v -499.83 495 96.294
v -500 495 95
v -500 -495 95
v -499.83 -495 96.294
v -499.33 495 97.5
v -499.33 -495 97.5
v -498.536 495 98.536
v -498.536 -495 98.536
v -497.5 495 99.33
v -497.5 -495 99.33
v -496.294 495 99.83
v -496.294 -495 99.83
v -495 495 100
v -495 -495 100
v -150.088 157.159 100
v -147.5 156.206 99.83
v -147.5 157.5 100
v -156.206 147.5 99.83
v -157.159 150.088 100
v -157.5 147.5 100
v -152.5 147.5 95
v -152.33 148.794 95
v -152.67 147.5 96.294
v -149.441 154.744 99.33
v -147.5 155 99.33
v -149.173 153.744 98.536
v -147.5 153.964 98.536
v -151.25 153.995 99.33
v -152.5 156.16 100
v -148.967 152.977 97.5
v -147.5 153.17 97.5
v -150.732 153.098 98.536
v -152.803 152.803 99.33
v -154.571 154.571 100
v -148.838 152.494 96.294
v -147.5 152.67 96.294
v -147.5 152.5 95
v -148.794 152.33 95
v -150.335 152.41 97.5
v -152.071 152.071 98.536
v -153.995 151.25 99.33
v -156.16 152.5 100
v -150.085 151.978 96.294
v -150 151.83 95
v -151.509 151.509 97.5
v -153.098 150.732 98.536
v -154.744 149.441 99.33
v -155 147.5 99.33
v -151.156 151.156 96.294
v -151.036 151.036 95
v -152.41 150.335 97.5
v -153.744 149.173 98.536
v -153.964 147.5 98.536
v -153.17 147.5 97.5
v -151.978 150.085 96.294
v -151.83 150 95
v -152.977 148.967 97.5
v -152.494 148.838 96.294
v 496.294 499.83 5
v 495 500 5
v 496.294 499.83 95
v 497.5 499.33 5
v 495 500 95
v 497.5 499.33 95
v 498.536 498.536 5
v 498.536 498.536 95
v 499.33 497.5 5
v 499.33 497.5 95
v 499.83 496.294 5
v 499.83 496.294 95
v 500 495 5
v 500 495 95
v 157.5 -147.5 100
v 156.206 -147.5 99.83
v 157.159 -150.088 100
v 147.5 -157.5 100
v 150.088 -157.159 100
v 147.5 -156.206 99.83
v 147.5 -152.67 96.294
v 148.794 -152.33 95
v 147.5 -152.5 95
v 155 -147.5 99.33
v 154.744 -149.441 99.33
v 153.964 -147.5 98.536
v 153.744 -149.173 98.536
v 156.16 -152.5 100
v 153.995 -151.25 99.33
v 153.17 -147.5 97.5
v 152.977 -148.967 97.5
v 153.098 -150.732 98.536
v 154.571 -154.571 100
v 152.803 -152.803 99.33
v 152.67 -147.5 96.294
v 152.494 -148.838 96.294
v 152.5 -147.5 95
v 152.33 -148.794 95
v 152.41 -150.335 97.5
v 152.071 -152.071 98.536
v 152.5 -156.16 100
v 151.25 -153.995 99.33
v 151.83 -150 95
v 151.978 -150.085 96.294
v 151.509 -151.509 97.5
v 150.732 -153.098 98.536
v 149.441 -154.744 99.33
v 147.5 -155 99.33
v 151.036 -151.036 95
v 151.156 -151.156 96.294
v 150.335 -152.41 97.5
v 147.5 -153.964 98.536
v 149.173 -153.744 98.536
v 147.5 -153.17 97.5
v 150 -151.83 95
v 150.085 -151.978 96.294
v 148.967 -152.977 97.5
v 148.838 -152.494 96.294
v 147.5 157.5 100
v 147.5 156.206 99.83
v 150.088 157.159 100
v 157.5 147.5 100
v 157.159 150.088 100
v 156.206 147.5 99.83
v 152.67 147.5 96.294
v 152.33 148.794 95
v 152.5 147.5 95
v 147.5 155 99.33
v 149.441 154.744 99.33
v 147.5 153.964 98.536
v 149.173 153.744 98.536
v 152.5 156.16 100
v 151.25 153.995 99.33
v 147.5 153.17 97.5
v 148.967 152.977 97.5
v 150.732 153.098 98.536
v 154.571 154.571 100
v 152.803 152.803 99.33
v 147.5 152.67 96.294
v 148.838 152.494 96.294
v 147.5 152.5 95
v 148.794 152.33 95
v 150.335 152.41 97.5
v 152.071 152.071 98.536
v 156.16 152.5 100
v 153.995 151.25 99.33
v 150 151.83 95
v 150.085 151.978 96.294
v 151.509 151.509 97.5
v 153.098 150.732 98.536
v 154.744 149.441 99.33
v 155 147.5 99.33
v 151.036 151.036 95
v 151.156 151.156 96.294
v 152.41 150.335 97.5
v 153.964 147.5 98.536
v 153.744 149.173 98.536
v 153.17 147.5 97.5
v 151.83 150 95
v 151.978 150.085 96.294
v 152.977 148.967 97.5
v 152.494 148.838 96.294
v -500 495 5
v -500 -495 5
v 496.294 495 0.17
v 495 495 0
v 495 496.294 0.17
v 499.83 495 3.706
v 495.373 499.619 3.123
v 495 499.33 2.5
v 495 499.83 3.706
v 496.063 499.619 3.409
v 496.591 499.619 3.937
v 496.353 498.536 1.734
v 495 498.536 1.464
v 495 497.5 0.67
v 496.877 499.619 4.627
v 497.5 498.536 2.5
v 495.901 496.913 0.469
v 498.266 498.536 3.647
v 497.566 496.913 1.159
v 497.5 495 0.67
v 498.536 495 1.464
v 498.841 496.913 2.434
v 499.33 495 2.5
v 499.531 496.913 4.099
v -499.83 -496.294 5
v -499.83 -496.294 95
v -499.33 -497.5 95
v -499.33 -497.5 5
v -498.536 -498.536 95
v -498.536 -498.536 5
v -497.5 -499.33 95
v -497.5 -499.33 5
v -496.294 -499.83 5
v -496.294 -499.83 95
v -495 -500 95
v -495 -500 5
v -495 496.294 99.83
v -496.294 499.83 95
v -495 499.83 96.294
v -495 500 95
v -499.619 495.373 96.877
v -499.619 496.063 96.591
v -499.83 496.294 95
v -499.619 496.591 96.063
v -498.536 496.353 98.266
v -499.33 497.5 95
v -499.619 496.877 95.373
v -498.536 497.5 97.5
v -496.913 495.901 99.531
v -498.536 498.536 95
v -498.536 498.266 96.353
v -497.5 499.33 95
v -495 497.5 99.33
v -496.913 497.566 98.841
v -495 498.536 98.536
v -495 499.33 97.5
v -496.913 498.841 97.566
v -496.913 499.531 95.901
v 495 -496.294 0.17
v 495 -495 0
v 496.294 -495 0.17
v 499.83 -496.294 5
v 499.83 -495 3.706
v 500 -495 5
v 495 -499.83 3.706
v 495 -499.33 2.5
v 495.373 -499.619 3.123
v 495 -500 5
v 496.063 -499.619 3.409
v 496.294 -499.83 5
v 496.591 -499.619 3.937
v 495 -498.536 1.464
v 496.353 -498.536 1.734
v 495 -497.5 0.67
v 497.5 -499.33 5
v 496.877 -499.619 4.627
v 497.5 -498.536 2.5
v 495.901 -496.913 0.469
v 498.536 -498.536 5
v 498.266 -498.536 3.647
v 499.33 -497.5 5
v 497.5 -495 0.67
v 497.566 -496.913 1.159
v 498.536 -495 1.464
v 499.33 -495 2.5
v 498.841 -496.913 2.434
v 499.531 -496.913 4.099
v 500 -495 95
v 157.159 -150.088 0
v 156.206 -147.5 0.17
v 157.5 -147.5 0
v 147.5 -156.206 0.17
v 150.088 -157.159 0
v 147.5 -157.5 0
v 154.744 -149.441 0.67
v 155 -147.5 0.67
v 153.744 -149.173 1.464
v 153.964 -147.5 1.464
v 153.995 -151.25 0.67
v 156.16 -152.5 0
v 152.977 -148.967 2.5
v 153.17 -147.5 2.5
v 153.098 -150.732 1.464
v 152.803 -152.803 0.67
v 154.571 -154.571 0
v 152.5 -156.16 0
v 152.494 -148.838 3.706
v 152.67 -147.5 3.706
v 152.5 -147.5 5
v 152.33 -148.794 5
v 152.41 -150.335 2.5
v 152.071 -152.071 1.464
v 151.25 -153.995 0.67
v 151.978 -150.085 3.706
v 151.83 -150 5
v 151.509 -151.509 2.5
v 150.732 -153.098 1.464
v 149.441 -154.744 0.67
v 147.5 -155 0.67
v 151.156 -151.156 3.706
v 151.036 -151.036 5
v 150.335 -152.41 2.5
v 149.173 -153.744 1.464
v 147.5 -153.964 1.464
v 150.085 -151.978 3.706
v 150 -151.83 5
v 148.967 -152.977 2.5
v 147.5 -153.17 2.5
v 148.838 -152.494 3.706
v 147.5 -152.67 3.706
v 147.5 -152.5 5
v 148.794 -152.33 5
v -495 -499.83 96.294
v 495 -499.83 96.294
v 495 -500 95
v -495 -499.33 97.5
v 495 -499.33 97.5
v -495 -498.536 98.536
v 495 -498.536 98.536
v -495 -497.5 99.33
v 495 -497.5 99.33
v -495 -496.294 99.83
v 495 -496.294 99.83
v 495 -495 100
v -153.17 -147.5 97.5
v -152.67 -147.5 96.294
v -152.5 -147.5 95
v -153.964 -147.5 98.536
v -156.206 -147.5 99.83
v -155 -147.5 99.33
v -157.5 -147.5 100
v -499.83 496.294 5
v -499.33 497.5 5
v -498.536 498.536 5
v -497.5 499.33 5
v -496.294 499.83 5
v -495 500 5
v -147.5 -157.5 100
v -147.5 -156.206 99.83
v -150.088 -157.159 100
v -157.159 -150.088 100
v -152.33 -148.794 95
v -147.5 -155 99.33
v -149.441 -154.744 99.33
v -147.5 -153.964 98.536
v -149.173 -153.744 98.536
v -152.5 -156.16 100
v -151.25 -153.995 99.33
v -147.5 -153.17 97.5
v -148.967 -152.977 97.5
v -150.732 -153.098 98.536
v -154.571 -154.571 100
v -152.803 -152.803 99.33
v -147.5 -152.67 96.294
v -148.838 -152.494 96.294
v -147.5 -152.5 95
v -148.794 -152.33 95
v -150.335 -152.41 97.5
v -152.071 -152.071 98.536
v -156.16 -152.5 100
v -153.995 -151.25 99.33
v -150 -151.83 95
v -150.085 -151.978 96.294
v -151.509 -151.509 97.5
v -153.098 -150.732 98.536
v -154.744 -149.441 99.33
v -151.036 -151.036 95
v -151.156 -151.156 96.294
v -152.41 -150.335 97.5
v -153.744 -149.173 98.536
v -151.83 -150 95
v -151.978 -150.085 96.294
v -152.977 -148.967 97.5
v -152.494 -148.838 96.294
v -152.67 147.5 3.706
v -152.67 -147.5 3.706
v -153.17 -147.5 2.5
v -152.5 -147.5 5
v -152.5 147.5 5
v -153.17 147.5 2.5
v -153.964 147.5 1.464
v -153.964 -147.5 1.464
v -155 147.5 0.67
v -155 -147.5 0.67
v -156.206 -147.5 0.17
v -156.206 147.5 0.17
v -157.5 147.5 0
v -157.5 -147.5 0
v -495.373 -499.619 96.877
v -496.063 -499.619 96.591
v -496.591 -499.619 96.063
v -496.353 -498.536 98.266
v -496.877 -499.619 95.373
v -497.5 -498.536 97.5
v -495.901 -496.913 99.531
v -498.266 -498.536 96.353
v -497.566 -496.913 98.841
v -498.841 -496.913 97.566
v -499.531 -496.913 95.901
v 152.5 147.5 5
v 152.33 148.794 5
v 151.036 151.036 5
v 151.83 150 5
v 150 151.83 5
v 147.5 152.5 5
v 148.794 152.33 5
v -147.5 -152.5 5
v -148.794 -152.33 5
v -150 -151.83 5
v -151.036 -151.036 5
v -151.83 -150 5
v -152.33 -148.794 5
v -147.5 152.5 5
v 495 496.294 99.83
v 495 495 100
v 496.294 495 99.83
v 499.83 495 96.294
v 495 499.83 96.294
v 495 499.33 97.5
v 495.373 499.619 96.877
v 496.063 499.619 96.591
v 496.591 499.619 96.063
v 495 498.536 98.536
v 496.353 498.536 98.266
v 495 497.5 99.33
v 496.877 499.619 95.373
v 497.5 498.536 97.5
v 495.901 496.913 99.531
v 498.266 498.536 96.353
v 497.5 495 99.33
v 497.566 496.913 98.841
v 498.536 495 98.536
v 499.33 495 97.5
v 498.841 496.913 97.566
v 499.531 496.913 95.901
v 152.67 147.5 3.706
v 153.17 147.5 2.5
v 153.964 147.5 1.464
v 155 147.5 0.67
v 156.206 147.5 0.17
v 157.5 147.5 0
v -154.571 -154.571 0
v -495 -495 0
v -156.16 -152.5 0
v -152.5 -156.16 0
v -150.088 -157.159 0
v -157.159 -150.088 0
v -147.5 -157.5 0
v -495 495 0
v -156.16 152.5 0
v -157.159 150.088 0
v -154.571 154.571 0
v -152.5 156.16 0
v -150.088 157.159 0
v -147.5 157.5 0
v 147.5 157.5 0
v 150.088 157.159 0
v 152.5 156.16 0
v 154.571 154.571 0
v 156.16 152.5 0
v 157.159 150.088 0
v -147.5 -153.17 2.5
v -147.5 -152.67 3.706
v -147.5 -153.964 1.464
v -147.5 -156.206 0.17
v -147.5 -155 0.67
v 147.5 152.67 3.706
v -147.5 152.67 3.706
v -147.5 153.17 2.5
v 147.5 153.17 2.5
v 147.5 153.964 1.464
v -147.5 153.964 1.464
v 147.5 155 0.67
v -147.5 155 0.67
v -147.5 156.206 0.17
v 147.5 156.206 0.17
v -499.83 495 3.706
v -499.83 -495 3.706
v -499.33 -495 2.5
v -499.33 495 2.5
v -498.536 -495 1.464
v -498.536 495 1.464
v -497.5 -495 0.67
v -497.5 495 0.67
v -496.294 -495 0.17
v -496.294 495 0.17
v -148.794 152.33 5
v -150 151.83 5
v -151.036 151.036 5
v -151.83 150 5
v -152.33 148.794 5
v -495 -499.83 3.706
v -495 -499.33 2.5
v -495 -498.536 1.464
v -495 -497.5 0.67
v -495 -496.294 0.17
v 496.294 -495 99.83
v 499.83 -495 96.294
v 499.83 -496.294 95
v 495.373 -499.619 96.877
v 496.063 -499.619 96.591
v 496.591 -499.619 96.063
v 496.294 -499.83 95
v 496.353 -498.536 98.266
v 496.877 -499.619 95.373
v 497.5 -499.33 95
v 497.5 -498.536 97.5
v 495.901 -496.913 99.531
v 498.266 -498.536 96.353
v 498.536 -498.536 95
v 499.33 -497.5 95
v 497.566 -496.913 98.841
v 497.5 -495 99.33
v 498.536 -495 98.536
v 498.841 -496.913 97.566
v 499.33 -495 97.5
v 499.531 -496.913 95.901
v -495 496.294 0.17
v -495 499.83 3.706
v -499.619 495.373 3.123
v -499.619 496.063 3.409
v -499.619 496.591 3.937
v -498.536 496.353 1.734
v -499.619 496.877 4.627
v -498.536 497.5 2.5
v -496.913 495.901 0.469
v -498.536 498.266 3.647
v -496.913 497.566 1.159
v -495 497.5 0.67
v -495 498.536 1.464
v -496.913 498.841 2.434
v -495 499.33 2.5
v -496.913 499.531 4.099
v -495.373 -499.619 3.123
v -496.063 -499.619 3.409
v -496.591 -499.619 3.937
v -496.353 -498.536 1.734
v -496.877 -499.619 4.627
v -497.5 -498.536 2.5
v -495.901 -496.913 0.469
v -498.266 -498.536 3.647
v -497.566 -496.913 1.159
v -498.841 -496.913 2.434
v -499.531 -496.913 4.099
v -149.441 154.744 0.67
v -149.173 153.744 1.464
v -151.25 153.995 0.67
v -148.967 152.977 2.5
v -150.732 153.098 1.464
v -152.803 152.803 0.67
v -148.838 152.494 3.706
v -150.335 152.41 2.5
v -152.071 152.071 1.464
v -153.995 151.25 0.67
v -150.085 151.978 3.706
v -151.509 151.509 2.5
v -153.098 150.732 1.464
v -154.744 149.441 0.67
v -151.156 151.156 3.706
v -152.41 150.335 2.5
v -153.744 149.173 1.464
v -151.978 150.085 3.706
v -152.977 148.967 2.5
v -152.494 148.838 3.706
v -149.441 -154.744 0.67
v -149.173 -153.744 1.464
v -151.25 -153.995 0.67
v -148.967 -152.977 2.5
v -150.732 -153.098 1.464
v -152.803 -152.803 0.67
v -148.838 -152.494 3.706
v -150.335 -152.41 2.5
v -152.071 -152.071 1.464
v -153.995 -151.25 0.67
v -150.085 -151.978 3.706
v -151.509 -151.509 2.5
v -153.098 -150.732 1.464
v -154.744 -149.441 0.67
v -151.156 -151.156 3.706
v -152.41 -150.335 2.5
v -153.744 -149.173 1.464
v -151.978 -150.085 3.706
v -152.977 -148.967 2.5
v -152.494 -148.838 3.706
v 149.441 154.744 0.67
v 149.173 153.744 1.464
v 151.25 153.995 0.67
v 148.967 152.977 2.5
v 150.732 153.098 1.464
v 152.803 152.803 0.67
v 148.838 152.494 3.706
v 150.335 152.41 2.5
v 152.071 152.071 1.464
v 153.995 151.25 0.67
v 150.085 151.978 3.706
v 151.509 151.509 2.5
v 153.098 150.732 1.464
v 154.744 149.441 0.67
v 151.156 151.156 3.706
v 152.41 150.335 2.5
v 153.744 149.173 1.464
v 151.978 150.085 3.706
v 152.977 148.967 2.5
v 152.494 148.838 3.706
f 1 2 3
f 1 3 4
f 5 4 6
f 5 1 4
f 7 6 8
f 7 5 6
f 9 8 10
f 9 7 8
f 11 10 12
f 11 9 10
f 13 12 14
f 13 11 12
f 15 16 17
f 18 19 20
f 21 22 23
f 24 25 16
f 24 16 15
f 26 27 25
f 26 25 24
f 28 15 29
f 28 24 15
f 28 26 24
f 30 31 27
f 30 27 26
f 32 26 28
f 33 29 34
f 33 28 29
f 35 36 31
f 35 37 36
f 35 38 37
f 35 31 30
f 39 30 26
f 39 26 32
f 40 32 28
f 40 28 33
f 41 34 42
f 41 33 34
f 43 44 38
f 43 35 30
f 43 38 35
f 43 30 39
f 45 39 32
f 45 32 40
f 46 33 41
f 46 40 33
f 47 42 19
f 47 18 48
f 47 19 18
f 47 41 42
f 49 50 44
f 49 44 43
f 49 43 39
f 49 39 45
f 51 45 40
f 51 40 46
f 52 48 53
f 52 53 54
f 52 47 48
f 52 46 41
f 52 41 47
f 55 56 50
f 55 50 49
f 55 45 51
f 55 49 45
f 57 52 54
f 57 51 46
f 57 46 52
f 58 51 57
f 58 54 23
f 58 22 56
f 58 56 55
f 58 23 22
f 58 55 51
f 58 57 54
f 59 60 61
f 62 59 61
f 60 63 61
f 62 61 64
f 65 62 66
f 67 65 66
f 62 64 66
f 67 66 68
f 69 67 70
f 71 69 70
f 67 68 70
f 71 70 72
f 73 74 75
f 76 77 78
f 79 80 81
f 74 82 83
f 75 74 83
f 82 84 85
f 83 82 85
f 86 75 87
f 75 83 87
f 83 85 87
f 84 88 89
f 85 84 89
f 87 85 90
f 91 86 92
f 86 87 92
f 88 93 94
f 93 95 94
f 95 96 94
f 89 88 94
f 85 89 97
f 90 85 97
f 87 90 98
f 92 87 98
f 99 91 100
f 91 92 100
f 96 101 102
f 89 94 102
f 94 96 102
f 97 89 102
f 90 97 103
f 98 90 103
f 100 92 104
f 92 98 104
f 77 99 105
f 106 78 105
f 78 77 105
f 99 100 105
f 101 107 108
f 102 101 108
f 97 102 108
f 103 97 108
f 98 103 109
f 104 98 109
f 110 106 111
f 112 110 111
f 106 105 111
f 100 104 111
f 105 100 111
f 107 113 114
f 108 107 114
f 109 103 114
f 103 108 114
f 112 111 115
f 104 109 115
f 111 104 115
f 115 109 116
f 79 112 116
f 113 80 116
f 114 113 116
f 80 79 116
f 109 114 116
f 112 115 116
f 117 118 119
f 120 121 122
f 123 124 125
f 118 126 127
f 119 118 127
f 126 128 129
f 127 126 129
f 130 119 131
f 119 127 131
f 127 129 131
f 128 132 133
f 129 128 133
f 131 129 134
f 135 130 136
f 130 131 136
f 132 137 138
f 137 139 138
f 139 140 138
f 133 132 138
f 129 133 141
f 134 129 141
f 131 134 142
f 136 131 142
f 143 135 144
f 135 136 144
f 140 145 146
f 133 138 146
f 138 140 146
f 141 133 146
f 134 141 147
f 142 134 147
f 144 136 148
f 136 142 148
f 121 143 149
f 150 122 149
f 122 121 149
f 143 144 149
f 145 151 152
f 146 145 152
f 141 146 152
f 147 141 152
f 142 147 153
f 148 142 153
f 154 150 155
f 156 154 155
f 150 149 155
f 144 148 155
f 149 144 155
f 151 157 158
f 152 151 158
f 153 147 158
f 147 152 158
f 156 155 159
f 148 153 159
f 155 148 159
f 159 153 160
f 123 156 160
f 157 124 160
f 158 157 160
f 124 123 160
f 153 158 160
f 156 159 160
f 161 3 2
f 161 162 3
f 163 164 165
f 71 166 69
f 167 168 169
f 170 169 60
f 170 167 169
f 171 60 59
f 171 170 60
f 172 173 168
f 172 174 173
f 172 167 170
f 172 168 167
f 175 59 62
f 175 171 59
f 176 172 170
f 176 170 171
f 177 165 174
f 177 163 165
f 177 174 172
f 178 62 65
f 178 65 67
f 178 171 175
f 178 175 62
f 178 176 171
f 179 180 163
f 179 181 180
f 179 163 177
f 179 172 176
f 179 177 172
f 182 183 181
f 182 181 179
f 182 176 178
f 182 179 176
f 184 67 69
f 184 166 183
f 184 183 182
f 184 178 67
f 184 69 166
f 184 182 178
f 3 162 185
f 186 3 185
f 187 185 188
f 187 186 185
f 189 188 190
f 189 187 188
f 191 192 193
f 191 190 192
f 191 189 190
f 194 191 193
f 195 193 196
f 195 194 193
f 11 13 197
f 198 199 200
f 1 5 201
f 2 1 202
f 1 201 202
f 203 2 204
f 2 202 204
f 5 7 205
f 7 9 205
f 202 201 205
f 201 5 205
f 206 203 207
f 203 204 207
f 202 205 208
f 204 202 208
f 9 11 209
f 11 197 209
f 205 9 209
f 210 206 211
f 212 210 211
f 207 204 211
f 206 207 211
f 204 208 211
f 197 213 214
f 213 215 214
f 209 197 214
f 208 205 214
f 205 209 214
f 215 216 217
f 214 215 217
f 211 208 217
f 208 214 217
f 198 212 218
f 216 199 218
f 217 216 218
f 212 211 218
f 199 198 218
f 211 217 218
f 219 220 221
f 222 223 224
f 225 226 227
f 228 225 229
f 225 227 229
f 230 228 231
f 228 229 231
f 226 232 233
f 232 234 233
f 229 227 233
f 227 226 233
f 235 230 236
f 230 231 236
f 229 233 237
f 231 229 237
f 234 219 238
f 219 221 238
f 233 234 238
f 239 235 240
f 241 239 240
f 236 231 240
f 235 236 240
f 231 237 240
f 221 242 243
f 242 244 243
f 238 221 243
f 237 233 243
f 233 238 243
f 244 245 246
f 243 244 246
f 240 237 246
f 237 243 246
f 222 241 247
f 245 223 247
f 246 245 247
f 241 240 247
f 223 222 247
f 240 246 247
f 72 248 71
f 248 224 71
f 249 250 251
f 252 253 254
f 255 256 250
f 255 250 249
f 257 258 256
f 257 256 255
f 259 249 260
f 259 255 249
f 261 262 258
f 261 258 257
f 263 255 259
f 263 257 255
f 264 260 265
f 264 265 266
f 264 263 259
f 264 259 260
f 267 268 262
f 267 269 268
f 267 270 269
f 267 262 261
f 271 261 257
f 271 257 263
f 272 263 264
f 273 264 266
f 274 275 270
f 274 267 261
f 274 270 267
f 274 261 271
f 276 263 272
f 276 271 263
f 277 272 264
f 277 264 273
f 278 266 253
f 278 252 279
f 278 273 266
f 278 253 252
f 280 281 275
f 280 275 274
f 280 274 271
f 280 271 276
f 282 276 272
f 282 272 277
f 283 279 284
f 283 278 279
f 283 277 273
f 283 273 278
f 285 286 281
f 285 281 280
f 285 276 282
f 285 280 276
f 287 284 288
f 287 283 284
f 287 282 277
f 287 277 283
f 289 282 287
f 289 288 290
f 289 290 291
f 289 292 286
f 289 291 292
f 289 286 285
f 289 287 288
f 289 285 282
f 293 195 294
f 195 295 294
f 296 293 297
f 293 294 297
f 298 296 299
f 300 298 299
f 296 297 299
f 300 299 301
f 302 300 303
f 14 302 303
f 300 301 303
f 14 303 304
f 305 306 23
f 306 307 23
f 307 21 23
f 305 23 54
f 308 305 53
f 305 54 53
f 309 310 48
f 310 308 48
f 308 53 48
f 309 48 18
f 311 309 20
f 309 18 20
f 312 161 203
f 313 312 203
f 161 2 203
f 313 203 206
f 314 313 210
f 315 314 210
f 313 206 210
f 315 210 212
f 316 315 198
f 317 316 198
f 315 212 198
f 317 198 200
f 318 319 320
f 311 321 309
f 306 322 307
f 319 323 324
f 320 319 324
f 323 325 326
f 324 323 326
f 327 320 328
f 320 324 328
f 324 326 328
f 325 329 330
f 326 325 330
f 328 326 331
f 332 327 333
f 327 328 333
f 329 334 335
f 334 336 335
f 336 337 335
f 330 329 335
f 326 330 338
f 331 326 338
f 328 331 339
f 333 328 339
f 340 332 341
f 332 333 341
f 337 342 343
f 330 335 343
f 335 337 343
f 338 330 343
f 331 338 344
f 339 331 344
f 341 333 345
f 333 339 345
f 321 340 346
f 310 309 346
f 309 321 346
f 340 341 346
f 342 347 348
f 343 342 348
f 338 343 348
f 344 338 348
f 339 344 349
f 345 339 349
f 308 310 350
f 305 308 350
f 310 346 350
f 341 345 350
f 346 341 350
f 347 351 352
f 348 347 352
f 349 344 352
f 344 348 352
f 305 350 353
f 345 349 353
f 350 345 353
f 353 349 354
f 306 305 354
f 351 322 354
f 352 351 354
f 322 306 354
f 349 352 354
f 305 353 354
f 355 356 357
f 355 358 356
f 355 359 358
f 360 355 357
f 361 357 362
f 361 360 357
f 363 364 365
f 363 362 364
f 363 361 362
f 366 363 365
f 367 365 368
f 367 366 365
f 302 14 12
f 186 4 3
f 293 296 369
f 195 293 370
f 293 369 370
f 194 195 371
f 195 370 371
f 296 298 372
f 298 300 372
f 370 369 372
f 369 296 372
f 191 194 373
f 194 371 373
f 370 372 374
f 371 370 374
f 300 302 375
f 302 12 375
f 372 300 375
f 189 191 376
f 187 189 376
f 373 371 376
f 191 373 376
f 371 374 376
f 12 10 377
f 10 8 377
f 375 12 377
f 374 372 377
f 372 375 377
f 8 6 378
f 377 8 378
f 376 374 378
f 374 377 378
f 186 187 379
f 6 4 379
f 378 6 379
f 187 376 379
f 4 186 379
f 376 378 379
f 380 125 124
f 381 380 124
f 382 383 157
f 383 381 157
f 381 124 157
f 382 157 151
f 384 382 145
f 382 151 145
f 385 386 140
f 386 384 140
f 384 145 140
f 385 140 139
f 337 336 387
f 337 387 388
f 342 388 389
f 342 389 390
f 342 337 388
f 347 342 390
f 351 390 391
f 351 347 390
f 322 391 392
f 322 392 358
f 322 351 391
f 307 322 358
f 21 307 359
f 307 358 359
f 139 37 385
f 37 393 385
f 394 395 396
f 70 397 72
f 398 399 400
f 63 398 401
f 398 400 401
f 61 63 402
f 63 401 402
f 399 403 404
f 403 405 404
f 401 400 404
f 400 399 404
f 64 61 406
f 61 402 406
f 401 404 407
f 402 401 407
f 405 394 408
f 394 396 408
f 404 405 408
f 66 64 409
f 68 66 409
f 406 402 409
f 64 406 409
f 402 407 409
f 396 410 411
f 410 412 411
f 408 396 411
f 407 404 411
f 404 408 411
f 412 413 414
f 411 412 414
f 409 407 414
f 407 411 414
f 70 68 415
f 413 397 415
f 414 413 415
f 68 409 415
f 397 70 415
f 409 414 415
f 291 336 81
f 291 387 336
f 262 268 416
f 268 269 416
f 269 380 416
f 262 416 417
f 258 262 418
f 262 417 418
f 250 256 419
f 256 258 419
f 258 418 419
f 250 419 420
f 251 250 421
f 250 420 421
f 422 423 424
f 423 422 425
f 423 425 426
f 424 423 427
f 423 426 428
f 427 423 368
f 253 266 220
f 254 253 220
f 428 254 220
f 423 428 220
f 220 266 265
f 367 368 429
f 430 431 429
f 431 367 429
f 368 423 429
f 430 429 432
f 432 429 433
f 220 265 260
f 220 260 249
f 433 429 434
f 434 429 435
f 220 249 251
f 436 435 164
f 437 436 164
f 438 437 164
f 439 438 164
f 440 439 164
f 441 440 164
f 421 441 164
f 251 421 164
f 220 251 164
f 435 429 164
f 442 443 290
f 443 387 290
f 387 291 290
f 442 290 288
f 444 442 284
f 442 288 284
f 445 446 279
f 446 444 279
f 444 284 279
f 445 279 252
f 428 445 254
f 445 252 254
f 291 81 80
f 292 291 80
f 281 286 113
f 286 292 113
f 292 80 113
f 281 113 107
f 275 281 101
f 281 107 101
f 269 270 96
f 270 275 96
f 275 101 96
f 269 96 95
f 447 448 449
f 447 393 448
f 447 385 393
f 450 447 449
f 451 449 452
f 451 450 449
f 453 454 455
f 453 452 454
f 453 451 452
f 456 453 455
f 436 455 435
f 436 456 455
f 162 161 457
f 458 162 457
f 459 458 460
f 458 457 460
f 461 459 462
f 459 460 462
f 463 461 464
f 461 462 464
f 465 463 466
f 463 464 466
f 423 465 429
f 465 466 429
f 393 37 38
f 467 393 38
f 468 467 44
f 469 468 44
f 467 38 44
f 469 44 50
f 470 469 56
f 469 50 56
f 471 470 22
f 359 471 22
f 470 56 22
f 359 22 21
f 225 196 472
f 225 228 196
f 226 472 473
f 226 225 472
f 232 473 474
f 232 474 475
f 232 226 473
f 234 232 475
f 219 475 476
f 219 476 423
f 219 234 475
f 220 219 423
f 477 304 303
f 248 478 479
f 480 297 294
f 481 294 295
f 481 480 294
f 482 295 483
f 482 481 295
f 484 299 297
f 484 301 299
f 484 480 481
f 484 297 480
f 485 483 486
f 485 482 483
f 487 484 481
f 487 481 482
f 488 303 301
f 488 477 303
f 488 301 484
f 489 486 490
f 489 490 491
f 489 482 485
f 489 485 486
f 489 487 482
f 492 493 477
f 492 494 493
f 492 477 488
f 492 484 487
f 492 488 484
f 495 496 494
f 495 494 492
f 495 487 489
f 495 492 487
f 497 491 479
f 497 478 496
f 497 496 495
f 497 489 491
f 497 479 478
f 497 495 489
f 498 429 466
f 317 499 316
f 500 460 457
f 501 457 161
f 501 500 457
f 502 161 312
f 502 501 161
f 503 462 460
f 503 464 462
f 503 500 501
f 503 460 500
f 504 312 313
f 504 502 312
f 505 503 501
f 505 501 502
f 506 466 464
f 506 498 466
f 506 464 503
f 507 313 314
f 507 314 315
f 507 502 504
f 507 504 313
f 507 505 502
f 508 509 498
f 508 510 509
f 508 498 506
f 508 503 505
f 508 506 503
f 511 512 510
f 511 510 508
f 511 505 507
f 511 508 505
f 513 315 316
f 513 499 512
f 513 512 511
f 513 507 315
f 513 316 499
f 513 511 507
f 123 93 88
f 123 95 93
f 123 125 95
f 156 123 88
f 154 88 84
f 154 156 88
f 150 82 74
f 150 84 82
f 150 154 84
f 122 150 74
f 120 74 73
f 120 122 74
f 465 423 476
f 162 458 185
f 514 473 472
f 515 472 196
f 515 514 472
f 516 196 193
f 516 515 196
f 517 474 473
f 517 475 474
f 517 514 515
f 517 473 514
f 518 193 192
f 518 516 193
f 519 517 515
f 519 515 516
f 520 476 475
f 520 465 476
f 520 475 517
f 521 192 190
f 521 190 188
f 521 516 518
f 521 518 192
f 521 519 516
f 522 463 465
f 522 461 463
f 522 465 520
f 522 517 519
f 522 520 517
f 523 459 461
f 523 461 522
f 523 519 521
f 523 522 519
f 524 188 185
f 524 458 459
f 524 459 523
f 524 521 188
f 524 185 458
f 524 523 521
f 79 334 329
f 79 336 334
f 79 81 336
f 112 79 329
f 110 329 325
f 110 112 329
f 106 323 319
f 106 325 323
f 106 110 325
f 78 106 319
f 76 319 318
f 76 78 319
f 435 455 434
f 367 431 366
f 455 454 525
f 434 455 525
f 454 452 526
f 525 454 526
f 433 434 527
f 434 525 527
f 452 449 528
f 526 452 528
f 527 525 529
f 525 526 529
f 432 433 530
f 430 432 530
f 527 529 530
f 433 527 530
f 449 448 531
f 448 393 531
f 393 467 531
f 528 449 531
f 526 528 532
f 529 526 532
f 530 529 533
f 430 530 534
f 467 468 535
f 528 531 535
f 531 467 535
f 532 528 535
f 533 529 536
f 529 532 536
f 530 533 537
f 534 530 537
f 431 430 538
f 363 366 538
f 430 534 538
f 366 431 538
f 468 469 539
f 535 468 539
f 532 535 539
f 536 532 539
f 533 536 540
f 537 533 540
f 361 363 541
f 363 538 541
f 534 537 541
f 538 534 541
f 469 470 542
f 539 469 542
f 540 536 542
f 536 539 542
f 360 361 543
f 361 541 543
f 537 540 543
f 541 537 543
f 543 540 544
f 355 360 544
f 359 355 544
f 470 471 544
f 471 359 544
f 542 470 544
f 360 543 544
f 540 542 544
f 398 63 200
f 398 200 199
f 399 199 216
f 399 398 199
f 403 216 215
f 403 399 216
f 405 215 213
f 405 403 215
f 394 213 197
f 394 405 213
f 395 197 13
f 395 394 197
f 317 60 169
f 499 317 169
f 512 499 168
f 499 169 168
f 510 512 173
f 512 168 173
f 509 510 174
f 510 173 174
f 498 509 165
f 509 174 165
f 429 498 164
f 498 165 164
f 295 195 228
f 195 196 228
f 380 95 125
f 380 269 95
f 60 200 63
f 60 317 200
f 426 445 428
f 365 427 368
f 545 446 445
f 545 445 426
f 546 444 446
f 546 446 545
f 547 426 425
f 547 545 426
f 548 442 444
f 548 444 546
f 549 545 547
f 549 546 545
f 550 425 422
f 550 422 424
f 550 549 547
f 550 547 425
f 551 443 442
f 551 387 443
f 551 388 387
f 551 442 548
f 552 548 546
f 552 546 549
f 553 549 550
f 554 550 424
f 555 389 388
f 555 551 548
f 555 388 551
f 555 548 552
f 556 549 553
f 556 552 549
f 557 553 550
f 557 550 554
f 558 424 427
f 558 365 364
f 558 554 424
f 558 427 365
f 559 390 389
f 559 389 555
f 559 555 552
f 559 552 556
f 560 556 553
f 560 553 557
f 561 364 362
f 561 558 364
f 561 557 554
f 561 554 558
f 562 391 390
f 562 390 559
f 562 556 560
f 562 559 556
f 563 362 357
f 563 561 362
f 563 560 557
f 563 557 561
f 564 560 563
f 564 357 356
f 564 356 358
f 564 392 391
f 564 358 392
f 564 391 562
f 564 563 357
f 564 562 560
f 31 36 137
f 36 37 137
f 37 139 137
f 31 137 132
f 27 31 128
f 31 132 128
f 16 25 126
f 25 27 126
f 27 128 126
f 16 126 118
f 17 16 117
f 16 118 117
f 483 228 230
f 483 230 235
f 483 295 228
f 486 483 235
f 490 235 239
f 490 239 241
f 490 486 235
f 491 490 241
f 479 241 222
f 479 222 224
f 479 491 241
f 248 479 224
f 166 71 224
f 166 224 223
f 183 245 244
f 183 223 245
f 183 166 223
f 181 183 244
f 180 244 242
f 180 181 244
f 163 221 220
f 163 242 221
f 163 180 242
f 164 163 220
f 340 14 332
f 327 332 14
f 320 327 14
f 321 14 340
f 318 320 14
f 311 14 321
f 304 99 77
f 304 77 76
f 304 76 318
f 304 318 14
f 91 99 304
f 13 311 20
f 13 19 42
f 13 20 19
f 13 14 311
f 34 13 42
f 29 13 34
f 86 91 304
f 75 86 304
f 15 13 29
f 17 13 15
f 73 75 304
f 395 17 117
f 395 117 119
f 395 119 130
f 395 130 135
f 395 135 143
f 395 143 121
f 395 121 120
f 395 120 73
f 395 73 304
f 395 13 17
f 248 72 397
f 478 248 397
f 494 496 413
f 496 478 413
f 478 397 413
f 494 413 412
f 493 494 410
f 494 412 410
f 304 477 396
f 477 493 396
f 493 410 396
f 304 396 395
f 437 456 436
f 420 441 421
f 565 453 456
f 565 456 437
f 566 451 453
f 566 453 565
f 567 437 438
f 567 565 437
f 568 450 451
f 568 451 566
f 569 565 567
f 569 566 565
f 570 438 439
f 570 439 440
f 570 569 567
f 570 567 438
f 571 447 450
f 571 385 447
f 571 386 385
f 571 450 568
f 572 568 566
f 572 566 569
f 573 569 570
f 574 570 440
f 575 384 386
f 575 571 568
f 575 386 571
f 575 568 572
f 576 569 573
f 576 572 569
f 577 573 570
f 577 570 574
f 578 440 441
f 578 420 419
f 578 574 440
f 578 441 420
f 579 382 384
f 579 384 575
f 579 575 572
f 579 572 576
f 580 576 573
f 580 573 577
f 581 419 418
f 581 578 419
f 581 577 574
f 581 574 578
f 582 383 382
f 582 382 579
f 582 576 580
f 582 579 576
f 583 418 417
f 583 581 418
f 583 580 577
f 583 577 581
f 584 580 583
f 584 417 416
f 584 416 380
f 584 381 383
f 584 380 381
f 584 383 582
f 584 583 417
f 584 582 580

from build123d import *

# Parameters (mm, degrees)
F0_W     = 1000
F0_H     = 1000
F0_W_2   = 305
F0_H_2   = 305
F1_DEPTH = 100
F2_R     = 5


with BuildPart() as f1:
    # F0 (on Top) → F1 (new body)
    with BuildSketch(Plane.XY):
        Rectangle(F0_W, F0_H)
        Rectangle(F0_W_2, F0_H_2, mode=Mode.SUBTRACT)
    extrude(amount=F1_DEPTH)

    # F2
    f2_edges = [f1.edges().sort_by_distance(p)[0] for p in [
        (500, 0, 100),
        (0, 500, 100),
        (-500, 0, 100),
        (0, -500, 100),
        (0, 152.5, 100),
        (152.5, 0, 100),
        (0, -152.5, 100),
        (-152.5, 0, 100),
        (500, 0, 0),
        (0, 500, 0),
        (-500, 0, 0),
        (0, -500, 0),
        (0, 152.5, 0),
        (152.5, 0, 0),
        (0, -152.5, 0),
        (-152.5, 0, 0),
        (-152.5, 152.5, 50),
        (152.5, 152.5, 50),
        (152.5, -152.5, 50),
        (-152.5, -152.5, 50),
        (500, 500, 50),
        (-500, 500, 50),
        (-500, -500, 50),
        (500, -500, 50),
    ]]
    fillet(f2_edges, radius=F2_R)


solid = f1.part
